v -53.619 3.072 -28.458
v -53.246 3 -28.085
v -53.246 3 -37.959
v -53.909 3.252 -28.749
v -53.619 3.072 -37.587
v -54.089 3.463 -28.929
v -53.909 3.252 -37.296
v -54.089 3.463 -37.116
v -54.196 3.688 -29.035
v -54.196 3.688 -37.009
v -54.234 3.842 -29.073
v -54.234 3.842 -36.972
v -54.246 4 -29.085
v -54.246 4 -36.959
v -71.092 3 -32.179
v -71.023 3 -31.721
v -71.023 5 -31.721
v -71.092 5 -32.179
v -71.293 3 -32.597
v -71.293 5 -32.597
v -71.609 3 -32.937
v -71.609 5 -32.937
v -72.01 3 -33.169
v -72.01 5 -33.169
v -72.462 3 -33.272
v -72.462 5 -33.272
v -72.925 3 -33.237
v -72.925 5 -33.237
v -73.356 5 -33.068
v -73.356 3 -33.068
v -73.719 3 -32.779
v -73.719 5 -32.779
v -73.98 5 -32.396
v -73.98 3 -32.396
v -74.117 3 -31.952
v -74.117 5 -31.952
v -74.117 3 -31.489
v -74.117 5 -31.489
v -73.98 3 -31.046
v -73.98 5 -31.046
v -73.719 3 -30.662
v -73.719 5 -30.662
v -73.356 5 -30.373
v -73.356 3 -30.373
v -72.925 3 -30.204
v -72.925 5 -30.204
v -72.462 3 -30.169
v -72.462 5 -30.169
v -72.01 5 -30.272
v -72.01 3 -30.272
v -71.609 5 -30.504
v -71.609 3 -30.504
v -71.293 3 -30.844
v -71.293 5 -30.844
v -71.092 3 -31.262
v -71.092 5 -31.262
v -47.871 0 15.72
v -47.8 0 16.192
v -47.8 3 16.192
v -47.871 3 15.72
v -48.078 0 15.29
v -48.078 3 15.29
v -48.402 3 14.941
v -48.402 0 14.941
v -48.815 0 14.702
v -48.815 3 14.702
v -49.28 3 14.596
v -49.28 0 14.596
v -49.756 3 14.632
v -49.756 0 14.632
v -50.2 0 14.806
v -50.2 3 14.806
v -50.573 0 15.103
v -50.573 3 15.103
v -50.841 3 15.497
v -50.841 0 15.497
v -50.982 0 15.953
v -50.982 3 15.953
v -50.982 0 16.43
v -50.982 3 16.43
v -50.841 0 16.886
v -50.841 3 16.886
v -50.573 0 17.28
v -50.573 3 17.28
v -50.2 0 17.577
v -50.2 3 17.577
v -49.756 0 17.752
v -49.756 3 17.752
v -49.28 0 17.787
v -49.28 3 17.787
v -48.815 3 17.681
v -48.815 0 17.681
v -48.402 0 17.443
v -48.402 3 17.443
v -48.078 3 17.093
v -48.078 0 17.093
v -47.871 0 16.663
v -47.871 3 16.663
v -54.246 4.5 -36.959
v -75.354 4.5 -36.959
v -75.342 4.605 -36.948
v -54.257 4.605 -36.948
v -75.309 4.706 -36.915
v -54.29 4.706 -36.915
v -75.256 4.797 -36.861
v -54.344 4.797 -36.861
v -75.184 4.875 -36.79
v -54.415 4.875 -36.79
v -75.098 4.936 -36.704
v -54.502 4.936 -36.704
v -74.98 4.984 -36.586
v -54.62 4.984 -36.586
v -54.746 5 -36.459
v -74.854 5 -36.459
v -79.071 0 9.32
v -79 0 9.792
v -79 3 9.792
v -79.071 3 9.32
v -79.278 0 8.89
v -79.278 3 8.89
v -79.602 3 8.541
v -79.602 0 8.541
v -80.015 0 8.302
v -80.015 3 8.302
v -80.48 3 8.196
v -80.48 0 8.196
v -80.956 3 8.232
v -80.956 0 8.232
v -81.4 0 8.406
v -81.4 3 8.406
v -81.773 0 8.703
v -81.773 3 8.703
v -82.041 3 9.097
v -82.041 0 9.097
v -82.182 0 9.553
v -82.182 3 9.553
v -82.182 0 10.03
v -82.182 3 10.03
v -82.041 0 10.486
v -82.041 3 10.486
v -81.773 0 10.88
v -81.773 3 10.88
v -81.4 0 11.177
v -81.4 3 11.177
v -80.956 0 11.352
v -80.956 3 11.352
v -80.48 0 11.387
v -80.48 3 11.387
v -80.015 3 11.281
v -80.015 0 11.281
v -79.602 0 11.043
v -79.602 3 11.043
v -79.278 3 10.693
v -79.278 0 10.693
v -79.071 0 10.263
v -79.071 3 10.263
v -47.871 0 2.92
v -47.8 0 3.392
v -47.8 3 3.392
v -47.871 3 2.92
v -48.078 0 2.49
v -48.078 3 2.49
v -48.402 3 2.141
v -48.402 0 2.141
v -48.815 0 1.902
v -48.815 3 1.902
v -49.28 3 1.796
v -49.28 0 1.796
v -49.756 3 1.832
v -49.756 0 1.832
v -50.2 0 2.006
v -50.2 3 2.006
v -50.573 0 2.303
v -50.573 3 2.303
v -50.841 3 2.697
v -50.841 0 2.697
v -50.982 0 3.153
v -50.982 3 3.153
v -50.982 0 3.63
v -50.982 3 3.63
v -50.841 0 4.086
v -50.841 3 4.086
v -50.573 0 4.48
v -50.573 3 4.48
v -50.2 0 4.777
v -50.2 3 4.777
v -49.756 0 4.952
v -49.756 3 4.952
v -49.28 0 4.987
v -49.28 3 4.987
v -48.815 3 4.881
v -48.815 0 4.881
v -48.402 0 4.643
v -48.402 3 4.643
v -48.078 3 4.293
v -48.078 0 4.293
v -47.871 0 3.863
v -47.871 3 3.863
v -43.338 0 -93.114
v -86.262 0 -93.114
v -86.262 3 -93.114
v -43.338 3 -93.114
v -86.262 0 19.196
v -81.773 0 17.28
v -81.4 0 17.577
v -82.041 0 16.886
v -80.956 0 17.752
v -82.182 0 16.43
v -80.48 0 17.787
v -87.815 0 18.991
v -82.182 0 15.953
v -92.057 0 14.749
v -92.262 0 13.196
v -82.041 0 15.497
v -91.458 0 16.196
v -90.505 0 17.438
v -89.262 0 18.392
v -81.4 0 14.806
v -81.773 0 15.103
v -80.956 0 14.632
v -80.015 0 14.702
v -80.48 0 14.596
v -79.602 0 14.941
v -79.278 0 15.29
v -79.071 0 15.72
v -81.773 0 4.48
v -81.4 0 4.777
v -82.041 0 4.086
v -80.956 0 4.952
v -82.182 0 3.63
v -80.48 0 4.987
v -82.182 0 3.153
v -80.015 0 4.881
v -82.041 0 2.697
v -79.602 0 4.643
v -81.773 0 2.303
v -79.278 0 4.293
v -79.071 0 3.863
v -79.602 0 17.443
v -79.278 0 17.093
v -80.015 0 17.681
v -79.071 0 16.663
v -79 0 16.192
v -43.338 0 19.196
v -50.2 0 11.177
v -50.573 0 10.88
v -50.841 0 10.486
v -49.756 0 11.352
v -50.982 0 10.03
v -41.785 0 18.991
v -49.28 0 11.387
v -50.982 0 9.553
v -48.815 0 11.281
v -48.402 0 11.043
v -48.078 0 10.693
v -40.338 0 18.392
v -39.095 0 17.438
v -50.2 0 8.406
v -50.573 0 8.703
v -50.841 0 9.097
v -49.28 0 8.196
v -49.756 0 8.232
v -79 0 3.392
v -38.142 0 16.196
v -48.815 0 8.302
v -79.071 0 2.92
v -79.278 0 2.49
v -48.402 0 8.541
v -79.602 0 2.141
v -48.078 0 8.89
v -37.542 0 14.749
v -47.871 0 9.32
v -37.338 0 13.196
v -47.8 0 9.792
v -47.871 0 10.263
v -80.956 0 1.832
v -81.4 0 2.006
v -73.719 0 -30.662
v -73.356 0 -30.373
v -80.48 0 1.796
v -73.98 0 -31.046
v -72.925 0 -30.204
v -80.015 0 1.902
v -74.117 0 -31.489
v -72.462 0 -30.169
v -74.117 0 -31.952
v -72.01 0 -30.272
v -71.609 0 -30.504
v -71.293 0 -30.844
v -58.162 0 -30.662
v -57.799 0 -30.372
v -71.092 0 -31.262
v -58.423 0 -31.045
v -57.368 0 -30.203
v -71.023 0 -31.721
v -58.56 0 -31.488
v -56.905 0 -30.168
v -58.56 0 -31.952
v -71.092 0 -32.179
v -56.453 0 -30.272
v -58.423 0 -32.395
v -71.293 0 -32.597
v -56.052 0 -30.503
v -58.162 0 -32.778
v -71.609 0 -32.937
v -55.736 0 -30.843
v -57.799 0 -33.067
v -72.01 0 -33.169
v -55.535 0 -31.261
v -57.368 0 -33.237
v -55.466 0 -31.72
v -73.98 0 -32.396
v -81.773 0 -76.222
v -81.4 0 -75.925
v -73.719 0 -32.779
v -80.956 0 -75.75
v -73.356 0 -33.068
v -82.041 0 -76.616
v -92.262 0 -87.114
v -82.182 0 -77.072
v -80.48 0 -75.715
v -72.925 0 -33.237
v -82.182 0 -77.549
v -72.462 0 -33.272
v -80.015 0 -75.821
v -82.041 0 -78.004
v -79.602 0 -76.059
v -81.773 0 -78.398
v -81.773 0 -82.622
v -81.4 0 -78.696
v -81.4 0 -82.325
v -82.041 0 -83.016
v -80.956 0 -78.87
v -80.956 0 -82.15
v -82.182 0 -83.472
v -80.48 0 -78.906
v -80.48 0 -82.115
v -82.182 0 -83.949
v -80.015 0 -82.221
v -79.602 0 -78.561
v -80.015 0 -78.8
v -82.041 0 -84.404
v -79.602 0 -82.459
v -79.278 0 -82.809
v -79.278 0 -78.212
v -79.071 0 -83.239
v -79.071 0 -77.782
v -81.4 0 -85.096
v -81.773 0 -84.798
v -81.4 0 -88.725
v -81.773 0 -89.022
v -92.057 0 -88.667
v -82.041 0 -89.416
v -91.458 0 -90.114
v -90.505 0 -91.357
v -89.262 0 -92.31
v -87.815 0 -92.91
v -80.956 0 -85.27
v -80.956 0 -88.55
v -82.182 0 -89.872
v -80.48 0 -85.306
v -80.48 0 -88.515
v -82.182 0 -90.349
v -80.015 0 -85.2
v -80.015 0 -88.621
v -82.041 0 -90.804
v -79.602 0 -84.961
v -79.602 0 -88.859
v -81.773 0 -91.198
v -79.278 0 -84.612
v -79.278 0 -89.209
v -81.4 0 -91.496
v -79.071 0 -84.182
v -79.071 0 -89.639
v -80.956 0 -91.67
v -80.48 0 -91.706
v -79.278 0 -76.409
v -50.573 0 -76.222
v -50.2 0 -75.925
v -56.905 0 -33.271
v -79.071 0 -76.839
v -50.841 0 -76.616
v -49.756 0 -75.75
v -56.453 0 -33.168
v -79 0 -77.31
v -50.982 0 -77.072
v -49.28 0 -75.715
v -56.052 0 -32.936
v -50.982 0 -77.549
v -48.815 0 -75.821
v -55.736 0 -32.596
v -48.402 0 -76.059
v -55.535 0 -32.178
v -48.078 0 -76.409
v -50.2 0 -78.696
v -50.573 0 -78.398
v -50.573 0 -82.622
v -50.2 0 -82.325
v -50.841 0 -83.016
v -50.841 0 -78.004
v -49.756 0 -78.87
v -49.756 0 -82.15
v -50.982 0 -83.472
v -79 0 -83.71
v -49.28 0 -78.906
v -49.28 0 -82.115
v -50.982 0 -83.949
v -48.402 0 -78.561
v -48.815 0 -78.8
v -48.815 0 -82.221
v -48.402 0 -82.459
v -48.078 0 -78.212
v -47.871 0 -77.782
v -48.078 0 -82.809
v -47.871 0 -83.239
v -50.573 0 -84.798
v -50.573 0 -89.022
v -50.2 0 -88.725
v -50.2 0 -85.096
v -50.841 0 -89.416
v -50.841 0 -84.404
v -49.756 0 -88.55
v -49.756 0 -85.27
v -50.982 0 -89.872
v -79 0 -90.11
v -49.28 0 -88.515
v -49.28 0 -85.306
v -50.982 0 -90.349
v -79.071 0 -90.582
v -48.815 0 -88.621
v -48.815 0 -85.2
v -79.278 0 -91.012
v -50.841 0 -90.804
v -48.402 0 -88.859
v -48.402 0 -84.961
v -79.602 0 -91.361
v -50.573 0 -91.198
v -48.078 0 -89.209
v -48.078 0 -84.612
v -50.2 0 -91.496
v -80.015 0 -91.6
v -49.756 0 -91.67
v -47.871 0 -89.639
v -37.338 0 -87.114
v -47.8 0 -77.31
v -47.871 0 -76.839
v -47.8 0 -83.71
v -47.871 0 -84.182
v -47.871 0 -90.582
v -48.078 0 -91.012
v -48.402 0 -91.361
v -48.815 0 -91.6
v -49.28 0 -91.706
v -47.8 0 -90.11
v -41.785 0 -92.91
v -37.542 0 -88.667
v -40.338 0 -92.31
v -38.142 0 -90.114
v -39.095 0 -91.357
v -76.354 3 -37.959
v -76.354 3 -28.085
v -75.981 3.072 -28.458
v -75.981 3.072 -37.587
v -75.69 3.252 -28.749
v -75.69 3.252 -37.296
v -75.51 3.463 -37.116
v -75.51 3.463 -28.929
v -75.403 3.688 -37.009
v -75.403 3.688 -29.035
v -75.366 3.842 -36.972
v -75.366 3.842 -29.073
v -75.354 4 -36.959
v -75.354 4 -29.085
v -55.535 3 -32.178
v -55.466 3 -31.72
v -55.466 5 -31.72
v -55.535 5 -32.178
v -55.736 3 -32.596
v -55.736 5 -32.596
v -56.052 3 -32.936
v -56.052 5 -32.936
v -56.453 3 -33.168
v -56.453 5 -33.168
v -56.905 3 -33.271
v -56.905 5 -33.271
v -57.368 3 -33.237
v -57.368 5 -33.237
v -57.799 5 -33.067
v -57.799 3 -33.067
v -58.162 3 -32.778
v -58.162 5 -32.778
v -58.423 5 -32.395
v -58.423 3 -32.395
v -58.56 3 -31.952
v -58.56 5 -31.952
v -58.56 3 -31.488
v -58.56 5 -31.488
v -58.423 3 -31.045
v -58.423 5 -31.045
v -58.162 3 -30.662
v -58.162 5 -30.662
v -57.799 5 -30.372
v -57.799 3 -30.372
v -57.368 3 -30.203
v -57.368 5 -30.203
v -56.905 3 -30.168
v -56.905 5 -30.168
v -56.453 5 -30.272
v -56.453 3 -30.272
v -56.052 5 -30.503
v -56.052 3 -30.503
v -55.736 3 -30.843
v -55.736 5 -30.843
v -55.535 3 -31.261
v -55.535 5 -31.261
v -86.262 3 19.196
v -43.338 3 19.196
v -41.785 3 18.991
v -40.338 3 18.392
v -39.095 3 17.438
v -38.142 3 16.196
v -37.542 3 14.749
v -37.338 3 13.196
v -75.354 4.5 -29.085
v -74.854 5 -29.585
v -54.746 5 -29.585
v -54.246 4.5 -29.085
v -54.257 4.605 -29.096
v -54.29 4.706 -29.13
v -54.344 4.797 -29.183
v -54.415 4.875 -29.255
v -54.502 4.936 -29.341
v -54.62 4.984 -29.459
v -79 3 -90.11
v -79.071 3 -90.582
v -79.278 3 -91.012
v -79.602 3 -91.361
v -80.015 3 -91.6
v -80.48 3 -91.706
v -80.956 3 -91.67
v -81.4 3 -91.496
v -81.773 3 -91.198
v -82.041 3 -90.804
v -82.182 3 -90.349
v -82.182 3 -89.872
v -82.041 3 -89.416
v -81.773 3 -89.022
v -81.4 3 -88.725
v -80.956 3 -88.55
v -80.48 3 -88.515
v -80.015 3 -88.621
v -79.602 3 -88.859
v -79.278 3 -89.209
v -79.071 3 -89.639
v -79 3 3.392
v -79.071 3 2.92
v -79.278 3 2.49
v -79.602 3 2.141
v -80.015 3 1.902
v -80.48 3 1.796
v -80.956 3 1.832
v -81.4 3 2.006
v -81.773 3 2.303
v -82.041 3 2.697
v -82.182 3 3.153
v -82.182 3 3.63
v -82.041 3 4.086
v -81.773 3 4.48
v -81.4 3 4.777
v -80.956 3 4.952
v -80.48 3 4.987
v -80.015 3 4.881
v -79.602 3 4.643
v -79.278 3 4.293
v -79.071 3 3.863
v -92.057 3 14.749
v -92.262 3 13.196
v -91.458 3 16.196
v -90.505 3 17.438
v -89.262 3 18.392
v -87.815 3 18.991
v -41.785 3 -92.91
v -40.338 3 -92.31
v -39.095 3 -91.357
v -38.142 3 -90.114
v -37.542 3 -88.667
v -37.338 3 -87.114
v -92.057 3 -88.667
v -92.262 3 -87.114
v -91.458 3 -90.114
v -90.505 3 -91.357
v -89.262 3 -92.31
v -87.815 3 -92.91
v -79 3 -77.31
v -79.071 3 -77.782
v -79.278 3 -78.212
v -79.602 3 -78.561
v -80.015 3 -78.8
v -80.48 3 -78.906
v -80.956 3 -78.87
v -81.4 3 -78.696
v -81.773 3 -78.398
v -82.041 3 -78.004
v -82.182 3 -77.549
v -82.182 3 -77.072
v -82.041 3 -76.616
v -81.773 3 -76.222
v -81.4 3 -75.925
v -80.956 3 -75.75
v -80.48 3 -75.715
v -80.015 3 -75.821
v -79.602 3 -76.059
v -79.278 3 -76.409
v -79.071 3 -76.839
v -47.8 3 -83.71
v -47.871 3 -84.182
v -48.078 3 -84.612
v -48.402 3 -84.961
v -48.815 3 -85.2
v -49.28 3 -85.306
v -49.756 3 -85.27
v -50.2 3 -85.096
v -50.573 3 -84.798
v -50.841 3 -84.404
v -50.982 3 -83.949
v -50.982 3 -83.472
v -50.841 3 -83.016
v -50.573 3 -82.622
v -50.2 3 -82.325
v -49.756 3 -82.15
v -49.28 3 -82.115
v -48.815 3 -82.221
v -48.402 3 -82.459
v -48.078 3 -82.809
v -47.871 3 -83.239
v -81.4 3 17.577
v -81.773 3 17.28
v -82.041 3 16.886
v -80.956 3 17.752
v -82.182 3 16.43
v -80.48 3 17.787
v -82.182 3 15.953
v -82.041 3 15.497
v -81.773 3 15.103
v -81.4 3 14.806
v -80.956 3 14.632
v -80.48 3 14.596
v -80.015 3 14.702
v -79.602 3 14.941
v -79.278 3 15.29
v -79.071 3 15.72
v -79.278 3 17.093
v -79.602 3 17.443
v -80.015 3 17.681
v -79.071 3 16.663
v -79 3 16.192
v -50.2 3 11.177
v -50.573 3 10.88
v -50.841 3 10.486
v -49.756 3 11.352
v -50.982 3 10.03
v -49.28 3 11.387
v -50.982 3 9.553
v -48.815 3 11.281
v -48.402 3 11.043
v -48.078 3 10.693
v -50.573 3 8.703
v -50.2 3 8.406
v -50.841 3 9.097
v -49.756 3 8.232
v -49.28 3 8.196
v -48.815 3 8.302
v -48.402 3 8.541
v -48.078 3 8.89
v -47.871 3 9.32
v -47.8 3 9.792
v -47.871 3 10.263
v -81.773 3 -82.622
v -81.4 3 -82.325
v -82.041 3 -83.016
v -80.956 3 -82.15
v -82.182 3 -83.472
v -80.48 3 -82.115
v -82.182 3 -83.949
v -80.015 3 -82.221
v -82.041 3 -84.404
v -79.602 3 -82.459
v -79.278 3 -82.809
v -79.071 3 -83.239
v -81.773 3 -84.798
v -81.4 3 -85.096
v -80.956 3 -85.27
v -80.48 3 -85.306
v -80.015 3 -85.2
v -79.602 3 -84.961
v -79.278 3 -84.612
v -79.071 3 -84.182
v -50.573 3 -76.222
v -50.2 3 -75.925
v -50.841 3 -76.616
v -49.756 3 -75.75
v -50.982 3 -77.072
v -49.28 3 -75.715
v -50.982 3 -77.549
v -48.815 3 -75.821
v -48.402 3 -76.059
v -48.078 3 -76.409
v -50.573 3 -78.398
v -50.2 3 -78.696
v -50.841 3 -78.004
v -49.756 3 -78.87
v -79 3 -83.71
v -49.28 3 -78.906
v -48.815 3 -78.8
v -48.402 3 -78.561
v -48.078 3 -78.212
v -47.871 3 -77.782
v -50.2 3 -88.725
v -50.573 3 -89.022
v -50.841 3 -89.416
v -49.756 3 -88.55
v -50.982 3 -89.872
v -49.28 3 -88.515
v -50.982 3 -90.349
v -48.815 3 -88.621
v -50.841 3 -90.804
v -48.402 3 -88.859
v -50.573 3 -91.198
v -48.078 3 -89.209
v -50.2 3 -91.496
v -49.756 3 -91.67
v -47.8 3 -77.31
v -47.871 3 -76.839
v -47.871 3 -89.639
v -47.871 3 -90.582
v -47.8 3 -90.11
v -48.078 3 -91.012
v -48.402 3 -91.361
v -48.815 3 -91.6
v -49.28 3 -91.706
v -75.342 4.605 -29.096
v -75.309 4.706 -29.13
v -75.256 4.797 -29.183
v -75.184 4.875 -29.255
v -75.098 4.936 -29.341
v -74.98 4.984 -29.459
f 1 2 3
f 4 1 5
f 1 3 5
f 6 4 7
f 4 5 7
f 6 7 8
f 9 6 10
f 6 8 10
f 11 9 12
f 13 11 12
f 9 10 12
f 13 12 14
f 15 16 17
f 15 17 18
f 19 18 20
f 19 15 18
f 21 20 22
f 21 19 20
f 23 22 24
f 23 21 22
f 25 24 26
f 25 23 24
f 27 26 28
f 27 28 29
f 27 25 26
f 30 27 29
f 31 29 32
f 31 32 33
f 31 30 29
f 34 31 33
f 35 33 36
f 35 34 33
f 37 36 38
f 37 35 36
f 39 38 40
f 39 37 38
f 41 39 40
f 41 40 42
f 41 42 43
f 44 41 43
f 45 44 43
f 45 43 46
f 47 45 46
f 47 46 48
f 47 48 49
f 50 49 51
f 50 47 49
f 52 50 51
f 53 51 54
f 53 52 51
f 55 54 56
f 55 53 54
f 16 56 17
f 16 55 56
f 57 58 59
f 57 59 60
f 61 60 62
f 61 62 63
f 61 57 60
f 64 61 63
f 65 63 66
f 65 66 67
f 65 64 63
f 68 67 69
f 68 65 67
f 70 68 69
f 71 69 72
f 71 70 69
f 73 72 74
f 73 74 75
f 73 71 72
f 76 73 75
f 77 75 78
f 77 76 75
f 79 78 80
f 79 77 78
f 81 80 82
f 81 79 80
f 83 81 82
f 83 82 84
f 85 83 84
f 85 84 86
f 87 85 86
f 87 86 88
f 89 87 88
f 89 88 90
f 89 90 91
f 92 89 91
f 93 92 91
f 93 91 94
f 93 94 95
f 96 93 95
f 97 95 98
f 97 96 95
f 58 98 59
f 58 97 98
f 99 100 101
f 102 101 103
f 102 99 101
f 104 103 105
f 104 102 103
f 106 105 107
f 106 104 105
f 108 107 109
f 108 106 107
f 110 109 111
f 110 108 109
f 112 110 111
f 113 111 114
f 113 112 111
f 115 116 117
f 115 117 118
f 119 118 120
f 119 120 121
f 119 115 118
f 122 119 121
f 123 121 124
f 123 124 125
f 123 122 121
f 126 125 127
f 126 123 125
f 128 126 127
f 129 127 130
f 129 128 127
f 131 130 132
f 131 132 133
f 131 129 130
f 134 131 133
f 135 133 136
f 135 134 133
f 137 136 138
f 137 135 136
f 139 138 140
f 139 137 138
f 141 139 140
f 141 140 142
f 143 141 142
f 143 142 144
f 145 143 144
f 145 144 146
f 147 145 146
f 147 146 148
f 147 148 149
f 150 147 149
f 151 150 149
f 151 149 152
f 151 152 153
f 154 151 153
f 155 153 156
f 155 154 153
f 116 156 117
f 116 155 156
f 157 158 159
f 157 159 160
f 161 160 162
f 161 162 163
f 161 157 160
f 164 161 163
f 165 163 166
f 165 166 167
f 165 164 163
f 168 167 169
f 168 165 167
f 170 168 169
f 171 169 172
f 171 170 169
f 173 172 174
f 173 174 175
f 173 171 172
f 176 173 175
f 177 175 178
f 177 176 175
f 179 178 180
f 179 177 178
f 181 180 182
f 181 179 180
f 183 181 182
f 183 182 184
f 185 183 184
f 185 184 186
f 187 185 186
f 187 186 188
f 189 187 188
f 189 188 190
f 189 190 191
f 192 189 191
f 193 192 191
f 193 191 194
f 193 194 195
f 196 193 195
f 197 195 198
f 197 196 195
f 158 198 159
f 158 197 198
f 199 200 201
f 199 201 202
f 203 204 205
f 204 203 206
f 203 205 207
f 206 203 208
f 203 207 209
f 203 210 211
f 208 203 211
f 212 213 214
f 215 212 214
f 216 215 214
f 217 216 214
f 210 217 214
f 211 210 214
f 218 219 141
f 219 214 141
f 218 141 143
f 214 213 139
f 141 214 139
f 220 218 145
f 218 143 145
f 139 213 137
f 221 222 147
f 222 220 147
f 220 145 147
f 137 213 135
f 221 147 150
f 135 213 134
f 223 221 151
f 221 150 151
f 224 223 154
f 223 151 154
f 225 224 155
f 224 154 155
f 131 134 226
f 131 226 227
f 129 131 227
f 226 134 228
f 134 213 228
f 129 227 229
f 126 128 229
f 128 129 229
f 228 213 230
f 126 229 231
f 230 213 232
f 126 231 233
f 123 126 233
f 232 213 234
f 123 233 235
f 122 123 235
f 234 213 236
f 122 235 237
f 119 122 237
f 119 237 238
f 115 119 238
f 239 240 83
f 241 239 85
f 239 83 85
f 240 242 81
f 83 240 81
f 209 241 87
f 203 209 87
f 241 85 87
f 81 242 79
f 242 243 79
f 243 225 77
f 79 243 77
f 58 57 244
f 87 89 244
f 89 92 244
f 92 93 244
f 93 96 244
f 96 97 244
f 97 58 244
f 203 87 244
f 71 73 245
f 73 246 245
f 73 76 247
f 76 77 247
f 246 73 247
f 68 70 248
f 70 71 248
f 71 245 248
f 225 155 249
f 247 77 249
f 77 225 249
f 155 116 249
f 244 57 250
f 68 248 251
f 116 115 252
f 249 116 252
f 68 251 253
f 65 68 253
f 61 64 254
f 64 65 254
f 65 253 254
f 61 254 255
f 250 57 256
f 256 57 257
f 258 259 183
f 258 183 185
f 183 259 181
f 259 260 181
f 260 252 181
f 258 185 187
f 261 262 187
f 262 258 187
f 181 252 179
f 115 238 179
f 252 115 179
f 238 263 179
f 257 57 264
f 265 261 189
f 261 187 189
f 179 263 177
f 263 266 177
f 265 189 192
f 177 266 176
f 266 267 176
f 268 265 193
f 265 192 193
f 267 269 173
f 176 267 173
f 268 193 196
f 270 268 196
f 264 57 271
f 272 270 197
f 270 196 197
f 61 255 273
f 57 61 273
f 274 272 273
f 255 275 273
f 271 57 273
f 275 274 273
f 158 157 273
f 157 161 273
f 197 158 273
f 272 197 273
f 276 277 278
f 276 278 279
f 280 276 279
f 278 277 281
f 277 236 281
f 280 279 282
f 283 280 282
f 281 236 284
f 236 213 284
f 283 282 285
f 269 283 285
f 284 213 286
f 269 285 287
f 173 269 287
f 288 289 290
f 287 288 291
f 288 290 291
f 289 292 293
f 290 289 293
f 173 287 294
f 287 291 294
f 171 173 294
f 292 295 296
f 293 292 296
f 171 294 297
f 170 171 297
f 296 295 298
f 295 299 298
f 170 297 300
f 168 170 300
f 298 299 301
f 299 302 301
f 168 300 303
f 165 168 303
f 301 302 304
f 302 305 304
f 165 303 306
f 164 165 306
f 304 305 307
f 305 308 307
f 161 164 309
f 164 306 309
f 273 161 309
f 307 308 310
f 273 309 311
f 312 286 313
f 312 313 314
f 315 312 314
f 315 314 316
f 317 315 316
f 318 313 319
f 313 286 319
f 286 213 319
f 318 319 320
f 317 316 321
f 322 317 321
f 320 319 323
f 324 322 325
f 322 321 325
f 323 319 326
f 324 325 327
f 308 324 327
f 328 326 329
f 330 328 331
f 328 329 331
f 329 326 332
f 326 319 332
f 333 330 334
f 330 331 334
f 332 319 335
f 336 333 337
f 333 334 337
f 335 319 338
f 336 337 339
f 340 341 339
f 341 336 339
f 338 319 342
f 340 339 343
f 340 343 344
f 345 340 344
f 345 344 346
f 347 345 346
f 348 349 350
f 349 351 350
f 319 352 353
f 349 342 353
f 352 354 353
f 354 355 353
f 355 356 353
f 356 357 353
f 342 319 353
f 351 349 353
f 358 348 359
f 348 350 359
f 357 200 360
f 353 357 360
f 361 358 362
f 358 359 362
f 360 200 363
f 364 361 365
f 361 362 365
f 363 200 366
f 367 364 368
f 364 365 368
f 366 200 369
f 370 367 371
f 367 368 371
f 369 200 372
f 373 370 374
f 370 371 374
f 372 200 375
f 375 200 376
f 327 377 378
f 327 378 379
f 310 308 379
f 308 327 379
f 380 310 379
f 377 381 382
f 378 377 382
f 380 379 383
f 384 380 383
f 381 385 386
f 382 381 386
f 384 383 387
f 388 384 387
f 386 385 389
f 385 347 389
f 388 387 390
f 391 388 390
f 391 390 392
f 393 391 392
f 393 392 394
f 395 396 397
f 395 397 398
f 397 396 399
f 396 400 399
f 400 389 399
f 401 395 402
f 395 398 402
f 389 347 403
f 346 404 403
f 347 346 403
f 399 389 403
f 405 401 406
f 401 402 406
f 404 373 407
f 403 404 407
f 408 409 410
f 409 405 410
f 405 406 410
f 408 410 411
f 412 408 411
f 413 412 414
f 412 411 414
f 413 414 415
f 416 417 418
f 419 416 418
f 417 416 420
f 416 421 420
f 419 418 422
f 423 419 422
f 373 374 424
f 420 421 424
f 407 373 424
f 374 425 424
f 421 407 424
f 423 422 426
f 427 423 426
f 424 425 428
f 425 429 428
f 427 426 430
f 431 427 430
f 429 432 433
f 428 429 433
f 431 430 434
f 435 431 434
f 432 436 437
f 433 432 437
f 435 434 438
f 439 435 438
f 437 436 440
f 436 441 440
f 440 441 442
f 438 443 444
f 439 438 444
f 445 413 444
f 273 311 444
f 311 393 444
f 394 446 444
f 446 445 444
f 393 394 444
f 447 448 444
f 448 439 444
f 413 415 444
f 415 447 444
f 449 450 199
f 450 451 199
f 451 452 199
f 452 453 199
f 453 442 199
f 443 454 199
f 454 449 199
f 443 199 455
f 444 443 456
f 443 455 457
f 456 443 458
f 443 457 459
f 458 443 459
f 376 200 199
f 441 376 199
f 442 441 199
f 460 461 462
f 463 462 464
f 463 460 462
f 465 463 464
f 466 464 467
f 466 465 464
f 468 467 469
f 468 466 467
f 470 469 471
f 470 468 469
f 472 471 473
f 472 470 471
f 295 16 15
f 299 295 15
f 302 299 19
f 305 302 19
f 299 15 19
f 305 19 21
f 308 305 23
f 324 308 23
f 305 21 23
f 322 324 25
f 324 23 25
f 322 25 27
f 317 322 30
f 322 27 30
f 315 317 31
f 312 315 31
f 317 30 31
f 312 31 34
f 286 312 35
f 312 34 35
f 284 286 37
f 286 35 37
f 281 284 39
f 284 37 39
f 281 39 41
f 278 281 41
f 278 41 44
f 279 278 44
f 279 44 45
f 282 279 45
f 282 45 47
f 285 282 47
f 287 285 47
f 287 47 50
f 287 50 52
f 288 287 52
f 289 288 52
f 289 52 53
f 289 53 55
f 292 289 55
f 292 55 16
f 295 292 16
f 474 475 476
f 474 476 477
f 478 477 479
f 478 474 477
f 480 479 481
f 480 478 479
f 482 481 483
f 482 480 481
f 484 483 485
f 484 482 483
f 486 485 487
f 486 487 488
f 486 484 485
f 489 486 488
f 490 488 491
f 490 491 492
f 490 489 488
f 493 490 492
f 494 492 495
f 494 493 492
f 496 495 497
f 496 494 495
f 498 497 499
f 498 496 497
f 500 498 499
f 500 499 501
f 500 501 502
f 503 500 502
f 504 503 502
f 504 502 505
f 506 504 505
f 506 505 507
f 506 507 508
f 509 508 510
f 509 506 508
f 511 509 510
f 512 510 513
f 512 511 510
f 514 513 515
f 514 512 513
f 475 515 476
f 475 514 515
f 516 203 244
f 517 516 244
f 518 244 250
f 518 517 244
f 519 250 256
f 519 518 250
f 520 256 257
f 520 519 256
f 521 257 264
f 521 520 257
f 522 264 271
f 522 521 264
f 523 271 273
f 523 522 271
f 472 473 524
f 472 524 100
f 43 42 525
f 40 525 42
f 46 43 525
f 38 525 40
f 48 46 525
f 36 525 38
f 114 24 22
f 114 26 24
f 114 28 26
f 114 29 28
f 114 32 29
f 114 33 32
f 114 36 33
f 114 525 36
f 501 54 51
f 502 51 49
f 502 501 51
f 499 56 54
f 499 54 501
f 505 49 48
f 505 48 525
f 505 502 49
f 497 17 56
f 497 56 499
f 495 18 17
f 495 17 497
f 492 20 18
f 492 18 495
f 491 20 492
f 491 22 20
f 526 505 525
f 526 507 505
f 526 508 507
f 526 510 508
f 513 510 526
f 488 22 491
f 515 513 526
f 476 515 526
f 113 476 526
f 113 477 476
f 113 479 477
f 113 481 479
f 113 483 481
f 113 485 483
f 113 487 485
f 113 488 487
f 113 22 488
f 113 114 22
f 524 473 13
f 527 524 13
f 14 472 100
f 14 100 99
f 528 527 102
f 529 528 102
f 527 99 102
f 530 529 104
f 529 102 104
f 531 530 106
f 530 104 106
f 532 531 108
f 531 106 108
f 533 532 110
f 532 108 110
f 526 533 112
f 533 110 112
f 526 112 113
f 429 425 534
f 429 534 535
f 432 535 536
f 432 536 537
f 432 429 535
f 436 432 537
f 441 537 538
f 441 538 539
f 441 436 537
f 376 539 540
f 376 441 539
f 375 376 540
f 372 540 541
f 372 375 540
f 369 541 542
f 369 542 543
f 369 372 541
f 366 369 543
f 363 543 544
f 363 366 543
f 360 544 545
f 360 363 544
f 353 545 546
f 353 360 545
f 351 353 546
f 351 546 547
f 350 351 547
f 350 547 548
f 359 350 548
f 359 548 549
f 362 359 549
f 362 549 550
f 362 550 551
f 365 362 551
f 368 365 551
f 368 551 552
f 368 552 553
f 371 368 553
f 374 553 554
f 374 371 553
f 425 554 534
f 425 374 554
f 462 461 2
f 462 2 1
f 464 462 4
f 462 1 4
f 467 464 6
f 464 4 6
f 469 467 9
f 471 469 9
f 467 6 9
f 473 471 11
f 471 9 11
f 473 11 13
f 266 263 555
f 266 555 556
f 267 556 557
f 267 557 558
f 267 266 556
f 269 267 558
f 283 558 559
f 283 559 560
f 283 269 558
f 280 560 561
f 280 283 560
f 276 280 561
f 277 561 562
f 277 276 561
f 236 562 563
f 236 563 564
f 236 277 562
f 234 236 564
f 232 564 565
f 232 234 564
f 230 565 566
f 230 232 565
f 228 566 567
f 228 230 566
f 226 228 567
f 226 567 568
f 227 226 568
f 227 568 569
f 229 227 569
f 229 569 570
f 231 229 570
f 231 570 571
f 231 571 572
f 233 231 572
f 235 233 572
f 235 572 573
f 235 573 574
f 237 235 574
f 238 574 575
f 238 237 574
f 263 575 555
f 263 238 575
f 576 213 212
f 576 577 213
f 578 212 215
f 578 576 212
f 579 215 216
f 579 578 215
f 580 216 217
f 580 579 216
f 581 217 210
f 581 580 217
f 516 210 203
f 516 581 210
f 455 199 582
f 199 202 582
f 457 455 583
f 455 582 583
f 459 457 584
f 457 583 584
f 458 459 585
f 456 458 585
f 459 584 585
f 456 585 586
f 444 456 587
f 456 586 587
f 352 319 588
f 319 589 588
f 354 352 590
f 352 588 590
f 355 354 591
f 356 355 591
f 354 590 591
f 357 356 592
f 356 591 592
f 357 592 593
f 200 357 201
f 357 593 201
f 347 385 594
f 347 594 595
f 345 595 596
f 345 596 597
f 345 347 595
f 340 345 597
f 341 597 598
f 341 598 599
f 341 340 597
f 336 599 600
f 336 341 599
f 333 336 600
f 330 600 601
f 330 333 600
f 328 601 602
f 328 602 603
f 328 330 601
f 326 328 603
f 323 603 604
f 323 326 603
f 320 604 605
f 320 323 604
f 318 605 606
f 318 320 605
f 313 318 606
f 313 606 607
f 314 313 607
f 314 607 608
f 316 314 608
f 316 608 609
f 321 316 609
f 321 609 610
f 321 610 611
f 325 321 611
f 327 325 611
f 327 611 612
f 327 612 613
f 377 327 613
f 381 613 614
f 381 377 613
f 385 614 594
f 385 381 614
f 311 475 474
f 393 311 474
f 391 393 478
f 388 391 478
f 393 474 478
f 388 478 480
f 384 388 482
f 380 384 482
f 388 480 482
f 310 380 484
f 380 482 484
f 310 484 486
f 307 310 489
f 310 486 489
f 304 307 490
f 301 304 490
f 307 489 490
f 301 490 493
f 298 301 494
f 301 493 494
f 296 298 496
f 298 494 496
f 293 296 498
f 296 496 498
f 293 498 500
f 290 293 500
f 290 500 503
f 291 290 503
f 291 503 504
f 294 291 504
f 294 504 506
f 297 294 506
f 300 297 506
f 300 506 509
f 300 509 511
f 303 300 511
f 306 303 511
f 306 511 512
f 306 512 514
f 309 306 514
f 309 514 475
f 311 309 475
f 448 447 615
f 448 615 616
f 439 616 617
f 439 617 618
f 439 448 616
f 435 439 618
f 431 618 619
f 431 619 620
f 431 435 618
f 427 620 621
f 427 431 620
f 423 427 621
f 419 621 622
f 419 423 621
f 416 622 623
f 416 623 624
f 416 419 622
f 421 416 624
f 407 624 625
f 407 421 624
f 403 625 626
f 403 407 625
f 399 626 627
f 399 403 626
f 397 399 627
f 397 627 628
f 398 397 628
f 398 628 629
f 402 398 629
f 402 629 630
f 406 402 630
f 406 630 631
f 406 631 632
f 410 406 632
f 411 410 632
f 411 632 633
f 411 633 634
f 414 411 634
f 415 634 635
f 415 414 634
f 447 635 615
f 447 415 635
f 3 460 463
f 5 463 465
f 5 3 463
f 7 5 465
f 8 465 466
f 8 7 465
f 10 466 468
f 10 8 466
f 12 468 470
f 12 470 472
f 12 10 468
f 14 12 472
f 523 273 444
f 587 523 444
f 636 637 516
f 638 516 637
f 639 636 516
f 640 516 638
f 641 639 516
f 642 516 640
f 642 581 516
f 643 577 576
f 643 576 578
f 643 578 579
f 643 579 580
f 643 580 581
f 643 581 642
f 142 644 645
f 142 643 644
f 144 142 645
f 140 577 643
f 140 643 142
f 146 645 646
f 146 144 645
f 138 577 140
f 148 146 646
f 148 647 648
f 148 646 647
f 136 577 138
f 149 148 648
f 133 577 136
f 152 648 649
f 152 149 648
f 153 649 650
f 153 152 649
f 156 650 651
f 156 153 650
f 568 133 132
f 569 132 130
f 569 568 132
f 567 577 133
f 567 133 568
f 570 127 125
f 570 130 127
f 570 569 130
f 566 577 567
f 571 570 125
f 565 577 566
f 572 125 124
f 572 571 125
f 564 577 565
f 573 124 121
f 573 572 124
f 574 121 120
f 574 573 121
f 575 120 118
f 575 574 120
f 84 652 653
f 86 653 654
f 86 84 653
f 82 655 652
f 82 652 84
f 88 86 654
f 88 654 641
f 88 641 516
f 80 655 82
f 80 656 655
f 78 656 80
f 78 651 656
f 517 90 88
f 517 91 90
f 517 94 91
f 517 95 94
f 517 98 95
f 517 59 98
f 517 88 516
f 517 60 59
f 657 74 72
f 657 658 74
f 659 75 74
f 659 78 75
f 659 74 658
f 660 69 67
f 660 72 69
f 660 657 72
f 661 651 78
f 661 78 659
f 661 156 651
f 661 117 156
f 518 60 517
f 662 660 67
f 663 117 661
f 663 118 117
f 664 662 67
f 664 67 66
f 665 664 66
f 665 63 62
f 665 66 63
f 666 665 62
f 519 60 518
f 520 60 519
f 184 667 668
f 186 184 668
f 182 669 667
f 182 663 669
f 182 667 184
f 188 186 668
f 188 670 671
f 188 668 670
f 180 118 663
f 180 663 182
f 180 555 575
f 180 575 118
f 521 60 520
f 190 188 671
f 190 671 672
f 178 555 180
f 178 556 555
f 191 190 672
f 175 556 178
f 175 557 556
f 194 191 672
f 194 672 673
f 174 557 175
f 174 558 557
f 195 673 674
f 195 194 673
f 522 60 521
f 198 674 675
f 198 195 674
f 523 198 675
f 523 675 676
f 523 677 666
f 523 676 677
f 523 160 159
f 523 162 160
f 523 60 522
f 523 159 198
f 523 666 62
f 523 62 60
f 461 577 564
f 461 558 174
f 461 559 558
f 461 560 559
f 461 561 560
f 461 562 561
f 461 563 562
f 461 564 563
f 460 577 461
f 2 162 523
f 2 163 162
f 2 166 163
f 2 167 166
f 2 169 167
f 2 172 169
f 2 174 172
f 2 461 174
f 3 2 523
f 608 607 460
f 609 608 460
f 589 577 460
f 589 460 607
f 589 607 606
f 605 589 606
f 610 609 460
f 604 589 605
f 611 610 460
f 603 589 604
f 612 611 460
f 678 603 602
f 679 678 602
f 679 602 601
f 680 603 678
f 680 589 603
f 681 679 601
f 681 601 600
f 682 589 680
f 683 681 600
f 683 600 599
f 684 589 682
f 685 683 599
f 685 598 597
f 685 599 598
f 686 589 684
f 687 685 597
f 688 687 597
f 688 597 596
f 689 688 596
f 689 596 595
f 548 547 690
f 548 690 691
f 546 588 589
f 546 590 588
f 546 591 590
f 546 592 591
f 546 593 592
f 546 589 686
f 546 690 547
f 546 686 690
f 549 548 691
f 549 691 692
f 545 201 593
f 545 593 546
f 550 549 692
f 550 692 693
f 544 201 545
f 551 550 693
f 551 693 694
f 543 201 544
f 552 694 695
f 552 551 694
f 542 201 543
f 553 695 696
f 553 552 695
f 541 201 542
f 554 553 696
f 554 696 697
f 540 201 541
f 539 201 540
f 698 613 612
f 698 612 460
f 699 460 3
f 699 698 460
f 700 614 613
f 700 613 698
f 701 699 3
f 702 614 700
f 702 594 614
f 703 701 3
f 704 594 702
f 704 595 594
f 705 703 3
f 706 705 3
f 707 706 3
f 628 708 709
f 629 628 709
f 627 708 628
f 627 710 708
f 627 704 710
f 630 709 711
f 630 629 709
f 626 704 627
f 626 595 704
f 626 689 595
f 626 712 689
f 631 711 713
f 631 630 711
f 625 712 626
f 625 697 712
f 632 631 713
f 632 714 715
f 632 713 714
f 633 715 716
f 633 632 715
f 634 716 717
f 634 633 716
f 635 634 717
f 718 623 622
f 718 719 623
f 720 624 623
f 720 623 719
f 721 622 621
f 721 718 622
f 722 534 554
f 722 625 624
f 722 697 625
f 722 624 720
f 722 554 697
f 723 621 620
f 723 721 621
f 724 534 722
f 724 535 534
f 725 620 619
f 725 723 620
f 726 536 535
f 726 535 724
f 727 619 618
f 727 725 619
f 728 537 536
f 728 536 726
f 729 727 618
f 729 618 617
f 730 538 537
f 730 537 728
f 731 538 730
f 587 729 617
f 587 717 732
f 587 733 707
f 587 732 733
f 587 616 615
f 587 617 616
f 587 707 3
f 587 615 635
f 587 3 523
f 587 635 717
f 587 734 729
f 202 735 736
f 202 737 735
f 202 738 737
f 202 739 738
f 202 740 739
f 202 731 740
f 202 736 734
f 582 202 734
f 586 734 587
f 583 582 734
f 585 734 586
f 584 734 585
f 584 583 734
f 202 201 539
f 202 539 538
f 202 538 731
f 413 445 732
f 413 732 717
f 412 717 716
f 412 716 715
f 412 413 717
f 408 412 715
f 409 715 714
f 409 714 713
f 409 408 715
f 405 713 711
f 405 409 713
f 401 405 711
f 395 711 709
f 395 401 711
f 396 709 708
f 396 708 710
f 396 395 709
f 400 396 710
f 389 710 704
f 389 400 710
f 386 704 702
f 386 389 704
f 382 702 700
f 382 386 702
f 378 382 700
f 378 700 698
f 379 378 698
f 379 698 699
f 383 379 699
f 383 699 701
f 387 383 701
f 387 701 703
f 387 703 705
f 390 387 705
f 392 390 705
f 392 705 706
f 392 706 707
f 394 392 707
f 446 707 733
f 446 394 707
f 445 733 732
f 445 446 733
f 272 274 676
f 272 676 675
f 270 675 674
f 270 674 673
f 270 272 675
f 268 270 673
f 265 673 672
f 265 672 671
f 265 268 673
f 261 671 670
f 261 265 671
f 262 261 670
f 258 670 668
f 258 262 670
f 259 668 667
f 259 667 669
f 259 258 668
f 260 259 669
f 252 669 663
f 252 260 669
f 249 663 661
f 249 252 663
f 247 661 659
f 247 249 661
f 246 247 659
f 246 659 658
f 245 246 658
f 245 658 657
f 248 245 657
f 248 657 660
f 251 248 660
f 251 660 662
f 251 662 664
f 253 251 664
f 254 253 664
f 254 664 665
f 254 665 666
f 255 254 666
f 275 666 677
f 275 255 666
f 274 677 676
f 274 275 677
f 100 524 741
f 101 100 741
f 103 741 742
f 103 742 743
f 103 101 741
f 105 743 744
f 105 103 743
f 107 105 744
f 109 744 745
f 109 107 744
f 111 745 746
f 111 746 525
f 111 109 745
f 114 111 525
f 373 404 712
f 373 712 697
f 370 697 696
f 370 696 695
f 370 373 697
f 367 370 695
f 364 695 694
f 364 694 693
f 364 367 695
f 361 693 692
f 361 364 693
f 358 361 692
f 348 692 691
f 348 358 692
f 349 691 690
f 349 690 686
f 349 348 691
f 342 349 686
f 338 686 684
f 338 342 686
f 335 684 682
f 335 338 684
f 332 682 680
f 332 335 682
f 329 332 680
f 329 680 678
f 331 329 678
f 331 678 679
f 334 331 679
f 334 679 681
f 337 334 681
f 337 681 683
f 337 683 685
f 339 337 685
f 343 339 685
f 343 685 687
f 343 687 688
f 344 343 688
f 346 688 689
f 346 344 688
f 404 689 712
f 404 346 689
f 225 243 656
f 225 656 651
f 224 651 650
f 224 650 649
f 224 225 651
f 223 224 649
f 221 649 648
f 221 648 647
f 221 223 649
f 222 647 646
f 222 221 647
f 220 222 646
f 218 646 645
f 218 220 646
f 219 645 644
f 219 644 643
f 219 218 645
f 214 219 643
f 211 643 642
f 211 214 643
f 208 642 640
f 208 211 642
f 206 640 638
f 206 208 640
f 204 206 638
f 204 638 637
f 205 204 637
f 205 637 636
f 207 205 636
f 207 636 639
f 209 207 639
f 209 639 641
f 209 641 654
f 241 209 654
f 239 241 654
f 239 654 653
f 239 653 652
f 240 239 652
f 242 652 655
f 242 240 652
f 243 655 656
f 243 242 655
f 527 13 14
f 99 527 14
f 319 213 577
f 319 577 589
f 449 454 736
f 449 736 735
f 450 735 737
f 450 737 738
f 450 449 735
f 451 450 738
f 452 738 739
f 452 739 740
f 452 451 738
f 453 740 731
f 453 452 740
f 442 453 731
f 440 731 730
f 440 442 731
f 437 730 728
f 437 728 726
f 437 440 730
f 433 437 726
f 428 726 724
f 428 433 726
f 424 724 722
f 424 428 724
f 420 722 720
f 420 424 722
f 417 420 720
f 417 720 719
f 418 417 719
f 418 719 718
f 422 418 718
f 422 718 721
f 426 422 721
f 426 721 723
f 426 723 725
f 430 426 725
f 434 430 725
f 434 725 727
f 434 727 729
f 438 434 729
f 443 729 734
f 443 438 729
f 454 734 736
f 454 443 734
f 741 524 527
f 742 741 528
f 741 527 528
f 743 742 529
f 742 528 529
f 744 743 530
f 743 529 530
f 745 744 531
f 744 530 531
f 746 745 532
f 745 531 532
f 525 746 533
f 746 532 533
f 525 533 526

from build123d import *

# Parameters (mm, degrees)
SKETCH1_W           = 54.92426628
SKETCH1_H           = 112.31
SKETCH1_R           = 1.6
BOSS_EXTRUDE1_DEPTH = 3
FILLET1_R           = 6
SKETCH2_W           = 21.1074
SKETCH2_H           = 7.874
SKETCH2_R           = 1.55575
BOSS_EXTRUDE2_DEPTH = 2
SKETCH2_4_R         = 1.55575
CUT_EXTRUDE1_DEPTH  = 4
FILLET2_R           = 1
FILLET3_R           = 0.5


with BuildPart() as part:
    # Sketch1 → Boss-Extrude1 (new body)
    with BuildSketch(Plane(origin=(0, 0, 0), x_dir=(1, 0, 0), z_dir=(0, 1, 0))):
        with Locations((-64.799805622, 36.959272125)):
            Rectangle(SKETCH1_W, SKETCH1_H)
        with Locations((-80.599805622, -16.191669117)):
            Circle(SKETCH1_R, mode=Mode.SUBTRACT)
        with Locations((-80.599805622, -9.791669117)):
            Circle(SKETCH1_R, mode=Mode.SUBTRACT)
        with Locations((-80.599805622, -3.391669117)):
            Circle(SKETCH1_R, mode=Mode.SUBTRACT)
        with Locations((-49.399805622, -3.391669117)):
            Circle(SKETCH1_R, mode=Mode.SUBTRACT)
        with Locations((-49.399805622, -9.791669117)):
            Circle(SKETCH1_R, mode=Mode.SUBTRACT)
        with Locations((-49.399805622, -16.191669117)):
            Circle(SKETCH1_R, mode=Mode.SUBTRACT)
        with Locations((-49.399805622, 90.110213368)):
            Circle(SKETCH1_R, mode=Mode.SUBTRACT)
        with Locations((-49.399805622, 83.710213368)):
            Circle(SKETCH1_R, mode=Mode.SUBTRACT)
        with Locations((-49.399805622, 77.310213368)):
            Circle(SKETCH1_R, mode=Mode.SUBTRACT)
        with Locations((-80.599805622, 77.310213368)):
            Circle(SKETCH1_R, mode=Mode.SUBTRACT)
        with Locations((-80.599805622, 83.710213368)):
            Circle(SKETCH1_R, mode=Mode.SUBTRACT)
        with Locations((-80.599805622, 90.110213368)):
            Circle(SKETCH1_R, mode=Mode.SUBTRACT)
    extrude(amount=BOSS_EXTRUDE1_DEPTH)

    # Fillet1
    fillet1_edges = [part.edges().sort_by_distance(p)[0] for p in [
        (-92.261938762, 1.5, -93.114272125),
        (-37.337672482, 1.5, -93.114272125),
        (-37.337672482, 1.5, 19.195727875),
        (-92.261938762, 1.5, 19.195727875),
    ]]
    fillet(fillet1_edges, radius=FILLET1_R)

    # Sketch2 → Boss-Extrude2 (add)
    with BuildSketch(Plane(origin=(0, 3, 0), x_dir=(1, 0, 0), z_dir=(0, 1, 0))):
        with Locations((-64.799805622, 33.022272125)):
            Rectangle(SKETCH2_W, SKETCH2_H)
        with Locations((-72.578555622, 31.720522125)):
            Circle(SKETCH2_R, mode=Mode.SUBTRACT)
        with Locations((-57.021525285, 31.719768414)):
            Circle(SKETCH2_R, mode=Mode.SUBTRACT)
    extrude(amount=BOSS_EXTRUDE2_DEPTH)

    # Sketch2<4> → Cut-Extrude1 (cut, through all)
    with BuildSketch(Plane(origin=(0, 3, 0), x_dir=(1, 0, 0), z_dir=(0, 1, 0))):
        with Locations((-72.578555622, 31.720522125)):
            Circle(SKETCH2_4_R)
        with Locations((-57.021525285, 31.719768414)):
            Circle(SKETCH2_4_R)
    extrude(amount=-CUT_EXTRUDE1_DEPTH, mode=Mode.SUBTRACT)

    # Fillet2
    fillet2_edges = [part.edges().sort_by_distance(p)[0] for p in [
        (-64.799805622, 3, -29.085272125),
        (-54.246105622, 3, -33.022272125),
        (-64.799805622, 3, -36.959272125),
        (-75.353505622, 3, -33.022272125),
    ]]
    fillet(fillet2_edges, radius=FILLET2_R)

    # Fillet3
    fillet3_edges = [part.edges().sort_by_distance(p)[0] for p in [
        (-64.799805622, 5, -36.959272125),
        (-75.353505622, 5, -33.022272125),
        (-64.799805622, 5, -29.085272125),
        (-54.246105622, 5, -33.022272125),
    ]]
    fillet(fillet3_edges, radius=FILLET3_R)


solid = part.part
